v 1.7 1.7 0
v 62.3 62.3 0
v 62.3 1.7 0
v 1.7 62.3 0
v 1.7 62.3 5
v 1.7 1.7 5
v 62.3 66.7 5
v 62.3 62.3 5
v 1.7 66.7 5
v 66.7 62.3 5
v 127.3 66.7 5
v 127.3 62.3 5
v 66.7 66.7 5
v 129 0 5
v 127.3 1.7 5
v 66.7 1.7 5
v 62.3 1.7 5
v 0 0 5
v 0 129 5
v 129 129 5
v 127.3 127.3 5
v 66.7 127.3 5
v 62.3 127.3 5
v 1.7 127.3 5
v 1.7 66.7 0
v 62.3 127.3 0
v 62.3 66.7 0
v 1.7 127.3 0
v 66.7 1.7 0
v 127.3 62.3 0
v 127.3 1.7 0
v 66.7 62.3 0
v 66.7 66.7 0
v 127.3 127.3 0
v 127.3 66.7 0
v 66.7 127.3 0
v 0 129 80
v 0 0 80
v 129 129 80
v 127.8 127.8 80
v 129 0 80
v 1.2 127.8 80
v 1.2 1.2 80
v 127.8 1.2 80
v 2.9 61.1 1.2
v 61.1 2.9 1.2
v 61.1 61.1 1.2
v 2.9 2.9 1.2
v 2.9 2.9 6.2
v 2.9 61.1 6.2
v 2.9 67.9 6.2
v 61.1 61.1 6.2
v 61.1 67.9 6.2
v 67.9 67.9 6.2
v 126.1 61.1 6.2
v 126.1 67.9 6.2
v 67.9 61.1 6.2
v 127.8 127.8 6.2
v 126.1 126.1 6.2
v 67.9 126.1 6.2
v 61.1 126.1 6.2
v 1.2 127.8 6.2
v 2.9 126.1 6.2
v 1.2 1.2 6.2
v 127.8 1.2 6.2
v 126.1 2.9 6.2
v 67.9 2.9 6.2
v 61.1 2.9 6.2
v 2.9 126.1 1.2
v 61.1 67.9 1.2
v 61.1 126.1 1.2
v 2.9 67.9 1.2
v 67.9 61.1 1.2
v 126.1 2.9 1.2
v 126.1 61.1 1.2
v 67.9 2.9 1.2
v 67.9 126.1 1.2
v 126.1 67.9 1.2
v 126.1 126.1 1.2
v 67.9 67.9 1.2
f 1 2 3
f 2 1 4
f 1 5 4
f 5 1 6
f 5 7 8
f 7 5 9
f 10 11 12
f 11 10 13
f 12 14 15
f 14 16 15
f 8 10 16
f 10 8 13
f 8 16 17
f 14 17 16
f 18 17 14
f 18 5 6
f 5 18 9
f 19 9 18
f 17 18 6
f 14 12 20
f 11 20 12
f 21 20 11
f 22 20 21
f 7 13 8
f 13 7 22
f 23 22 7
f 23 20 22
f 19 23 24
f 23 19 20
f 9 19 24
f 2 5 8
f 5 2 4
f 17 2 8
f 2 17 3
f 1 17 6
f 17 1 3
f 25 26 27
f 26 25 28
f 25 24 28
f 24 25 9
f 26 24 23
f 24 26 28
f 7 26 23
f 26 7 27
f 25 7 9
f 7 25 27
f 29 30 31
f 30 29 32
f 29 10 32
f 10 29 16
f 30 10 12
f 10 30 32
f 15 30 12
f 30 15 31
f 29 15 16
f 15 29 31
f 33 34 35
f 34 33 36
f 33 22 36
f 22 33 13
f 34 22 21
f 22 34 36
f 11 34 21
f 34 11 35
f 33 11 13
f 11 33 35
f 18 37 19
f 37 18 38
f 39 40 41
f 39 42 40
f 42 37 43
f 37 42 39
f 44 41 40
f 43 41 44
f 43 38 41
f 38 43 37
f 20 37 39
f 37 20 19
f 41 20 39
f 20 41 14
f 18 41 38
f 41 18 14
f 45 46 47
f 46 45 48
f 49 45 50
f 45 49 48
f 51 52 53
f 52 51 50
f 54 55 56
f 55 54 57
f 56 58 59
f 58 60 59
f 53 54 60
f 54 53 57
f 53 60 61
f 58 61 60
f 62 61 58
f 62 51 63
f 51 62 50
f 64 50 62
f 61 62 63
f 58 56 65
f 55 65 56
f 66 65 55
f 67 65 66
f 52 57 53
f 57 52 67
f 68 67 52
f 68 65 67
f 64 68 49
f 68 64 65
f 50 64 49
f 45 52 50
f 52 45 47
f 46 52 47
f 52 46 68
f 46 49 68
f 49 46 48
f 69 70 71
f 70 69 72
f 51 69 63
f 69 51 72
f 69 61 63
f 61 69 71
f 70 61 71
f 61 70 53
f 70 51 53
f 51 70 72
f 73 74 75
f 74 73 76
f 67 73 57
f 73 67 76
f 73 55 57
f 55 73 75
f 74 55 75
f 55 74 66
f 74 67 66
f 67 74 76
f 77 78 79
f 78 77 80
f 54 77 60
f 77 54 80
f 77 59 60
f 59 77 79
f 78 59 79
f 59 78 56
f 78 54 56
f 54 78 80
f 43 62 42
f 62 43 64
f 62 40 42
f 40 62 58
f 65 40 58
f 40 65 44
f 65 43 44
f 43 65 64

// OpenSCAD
// box connector parameters
// oficina
//unit_side = 55;
//unit_height = 45;
// mesa de luz
unit_side = 65;
unit_height = 75;
connector_height = 5;
connector_base = 5;

tolerance = 1;
wall = 1.2;

//base 5x5
//printer 3x3
//translate([0,0,-2]) base(2, 1);
//translate([calcSizeTest(0),calcSizeTest(0),calcHeight(0) + 1]) 
box(2, 2, 1);
//color("blue")
//translate([calcSizeTest(0),calcSizeTest(0),calcHeight(1) + 2]) box(1, 1, 1);
//color("green")
//translate([calcSizeTest(0),calcSizeTest(1),calcHeight(0) + 1]) box(2, 1, 2);

function calcSizeTest(units) = calcSize(units) + tolerance/2;

function calcSize(units) = units * unit_side;
function calcHeight(units) = units * unit_height;

module connector(width, length) {
    // Width and length in connector units.
    // Width = 2 means a side with size 2 * unit_side
    total_width = (width * unit_side);
    total_length = (length * unit_side);
    
    difference() {
        cube([
            total_width, 
            total_length, 
            connector_height + wall
        ], center = false);
        translate([wall + tolerance/2, wall + tolerance/2, wall]) cube([
            total_width - 2*wall - tolerance, 
            total_length - 2*wall - tolerance, 
            connector_height + wall
        ], center = false);
        translate([connector_base, connector_base, -connector_height]) cube([
            total_width - 2*connector_base, 
            total_length - 2*connector_base, 
            4*connector_height
        ], center = false);
    }
    
}


module base(width, length) {
    for (x =[0:width-1])
       for (y =[0:length-1]) 
           translate([calcSize(x),calcSize(y),0]) connector(1, 1);
}

module outer_box(width, length, height) { 
 
    for(x = [0 : width-1])
    {
        for(y = [0 : length-1])
        {
            translate([
                calcSize(x)+wall+tolerance/2,
                calcSize(y)+wall+tolerance/2, 
                0
            ])
                linear_extrude(connector_height,center = false)
                    square([
                        calcSize(1) - (2*wall) - 2*tolerance,
                        calcSize(1) - (2*wall) - 2*tolerance
                    ],center = false);
        } 
    }  
        
    translate([0,0,connector_height])
        linear_extrude(calcHeight(height),center = false)
            square([
                calcSize(width) - tolerance,
                calcSize(length) - tolerance
            ],center = false);
}

module inner_box(width, length, height) {
    for(x = [0 : width-1])
    {
        for(y = [0 : length-1])
        {
            translate([
                calcSize(x)+2*wall+tolerance/2,
                calcSize(y)+2*wall+tolerance/2, 
                wall
            ])
                linear_extrude(connector_height,center = false)
                    square([
                        calcSize(1) - (4*wall) - 2*tolerance,
                        calcSize(1) - (4*wall) - 2*tolerance
                    ],center = false);
        } 
    }
    
    translate([wall, wall, connector_height+wall])
        linear_extrude(calcHeight(height),center = false)
            square([
                calcSize(width) - (2*wall) - tolerance,
                calcSize(length) - (2*wall) - tolerance
            ],center = false);
}

module box(width, length, height) {
    color("red")
    difference() {
        outer_box(width, length, height);
        inner_box(width, length, height);
    }
}
